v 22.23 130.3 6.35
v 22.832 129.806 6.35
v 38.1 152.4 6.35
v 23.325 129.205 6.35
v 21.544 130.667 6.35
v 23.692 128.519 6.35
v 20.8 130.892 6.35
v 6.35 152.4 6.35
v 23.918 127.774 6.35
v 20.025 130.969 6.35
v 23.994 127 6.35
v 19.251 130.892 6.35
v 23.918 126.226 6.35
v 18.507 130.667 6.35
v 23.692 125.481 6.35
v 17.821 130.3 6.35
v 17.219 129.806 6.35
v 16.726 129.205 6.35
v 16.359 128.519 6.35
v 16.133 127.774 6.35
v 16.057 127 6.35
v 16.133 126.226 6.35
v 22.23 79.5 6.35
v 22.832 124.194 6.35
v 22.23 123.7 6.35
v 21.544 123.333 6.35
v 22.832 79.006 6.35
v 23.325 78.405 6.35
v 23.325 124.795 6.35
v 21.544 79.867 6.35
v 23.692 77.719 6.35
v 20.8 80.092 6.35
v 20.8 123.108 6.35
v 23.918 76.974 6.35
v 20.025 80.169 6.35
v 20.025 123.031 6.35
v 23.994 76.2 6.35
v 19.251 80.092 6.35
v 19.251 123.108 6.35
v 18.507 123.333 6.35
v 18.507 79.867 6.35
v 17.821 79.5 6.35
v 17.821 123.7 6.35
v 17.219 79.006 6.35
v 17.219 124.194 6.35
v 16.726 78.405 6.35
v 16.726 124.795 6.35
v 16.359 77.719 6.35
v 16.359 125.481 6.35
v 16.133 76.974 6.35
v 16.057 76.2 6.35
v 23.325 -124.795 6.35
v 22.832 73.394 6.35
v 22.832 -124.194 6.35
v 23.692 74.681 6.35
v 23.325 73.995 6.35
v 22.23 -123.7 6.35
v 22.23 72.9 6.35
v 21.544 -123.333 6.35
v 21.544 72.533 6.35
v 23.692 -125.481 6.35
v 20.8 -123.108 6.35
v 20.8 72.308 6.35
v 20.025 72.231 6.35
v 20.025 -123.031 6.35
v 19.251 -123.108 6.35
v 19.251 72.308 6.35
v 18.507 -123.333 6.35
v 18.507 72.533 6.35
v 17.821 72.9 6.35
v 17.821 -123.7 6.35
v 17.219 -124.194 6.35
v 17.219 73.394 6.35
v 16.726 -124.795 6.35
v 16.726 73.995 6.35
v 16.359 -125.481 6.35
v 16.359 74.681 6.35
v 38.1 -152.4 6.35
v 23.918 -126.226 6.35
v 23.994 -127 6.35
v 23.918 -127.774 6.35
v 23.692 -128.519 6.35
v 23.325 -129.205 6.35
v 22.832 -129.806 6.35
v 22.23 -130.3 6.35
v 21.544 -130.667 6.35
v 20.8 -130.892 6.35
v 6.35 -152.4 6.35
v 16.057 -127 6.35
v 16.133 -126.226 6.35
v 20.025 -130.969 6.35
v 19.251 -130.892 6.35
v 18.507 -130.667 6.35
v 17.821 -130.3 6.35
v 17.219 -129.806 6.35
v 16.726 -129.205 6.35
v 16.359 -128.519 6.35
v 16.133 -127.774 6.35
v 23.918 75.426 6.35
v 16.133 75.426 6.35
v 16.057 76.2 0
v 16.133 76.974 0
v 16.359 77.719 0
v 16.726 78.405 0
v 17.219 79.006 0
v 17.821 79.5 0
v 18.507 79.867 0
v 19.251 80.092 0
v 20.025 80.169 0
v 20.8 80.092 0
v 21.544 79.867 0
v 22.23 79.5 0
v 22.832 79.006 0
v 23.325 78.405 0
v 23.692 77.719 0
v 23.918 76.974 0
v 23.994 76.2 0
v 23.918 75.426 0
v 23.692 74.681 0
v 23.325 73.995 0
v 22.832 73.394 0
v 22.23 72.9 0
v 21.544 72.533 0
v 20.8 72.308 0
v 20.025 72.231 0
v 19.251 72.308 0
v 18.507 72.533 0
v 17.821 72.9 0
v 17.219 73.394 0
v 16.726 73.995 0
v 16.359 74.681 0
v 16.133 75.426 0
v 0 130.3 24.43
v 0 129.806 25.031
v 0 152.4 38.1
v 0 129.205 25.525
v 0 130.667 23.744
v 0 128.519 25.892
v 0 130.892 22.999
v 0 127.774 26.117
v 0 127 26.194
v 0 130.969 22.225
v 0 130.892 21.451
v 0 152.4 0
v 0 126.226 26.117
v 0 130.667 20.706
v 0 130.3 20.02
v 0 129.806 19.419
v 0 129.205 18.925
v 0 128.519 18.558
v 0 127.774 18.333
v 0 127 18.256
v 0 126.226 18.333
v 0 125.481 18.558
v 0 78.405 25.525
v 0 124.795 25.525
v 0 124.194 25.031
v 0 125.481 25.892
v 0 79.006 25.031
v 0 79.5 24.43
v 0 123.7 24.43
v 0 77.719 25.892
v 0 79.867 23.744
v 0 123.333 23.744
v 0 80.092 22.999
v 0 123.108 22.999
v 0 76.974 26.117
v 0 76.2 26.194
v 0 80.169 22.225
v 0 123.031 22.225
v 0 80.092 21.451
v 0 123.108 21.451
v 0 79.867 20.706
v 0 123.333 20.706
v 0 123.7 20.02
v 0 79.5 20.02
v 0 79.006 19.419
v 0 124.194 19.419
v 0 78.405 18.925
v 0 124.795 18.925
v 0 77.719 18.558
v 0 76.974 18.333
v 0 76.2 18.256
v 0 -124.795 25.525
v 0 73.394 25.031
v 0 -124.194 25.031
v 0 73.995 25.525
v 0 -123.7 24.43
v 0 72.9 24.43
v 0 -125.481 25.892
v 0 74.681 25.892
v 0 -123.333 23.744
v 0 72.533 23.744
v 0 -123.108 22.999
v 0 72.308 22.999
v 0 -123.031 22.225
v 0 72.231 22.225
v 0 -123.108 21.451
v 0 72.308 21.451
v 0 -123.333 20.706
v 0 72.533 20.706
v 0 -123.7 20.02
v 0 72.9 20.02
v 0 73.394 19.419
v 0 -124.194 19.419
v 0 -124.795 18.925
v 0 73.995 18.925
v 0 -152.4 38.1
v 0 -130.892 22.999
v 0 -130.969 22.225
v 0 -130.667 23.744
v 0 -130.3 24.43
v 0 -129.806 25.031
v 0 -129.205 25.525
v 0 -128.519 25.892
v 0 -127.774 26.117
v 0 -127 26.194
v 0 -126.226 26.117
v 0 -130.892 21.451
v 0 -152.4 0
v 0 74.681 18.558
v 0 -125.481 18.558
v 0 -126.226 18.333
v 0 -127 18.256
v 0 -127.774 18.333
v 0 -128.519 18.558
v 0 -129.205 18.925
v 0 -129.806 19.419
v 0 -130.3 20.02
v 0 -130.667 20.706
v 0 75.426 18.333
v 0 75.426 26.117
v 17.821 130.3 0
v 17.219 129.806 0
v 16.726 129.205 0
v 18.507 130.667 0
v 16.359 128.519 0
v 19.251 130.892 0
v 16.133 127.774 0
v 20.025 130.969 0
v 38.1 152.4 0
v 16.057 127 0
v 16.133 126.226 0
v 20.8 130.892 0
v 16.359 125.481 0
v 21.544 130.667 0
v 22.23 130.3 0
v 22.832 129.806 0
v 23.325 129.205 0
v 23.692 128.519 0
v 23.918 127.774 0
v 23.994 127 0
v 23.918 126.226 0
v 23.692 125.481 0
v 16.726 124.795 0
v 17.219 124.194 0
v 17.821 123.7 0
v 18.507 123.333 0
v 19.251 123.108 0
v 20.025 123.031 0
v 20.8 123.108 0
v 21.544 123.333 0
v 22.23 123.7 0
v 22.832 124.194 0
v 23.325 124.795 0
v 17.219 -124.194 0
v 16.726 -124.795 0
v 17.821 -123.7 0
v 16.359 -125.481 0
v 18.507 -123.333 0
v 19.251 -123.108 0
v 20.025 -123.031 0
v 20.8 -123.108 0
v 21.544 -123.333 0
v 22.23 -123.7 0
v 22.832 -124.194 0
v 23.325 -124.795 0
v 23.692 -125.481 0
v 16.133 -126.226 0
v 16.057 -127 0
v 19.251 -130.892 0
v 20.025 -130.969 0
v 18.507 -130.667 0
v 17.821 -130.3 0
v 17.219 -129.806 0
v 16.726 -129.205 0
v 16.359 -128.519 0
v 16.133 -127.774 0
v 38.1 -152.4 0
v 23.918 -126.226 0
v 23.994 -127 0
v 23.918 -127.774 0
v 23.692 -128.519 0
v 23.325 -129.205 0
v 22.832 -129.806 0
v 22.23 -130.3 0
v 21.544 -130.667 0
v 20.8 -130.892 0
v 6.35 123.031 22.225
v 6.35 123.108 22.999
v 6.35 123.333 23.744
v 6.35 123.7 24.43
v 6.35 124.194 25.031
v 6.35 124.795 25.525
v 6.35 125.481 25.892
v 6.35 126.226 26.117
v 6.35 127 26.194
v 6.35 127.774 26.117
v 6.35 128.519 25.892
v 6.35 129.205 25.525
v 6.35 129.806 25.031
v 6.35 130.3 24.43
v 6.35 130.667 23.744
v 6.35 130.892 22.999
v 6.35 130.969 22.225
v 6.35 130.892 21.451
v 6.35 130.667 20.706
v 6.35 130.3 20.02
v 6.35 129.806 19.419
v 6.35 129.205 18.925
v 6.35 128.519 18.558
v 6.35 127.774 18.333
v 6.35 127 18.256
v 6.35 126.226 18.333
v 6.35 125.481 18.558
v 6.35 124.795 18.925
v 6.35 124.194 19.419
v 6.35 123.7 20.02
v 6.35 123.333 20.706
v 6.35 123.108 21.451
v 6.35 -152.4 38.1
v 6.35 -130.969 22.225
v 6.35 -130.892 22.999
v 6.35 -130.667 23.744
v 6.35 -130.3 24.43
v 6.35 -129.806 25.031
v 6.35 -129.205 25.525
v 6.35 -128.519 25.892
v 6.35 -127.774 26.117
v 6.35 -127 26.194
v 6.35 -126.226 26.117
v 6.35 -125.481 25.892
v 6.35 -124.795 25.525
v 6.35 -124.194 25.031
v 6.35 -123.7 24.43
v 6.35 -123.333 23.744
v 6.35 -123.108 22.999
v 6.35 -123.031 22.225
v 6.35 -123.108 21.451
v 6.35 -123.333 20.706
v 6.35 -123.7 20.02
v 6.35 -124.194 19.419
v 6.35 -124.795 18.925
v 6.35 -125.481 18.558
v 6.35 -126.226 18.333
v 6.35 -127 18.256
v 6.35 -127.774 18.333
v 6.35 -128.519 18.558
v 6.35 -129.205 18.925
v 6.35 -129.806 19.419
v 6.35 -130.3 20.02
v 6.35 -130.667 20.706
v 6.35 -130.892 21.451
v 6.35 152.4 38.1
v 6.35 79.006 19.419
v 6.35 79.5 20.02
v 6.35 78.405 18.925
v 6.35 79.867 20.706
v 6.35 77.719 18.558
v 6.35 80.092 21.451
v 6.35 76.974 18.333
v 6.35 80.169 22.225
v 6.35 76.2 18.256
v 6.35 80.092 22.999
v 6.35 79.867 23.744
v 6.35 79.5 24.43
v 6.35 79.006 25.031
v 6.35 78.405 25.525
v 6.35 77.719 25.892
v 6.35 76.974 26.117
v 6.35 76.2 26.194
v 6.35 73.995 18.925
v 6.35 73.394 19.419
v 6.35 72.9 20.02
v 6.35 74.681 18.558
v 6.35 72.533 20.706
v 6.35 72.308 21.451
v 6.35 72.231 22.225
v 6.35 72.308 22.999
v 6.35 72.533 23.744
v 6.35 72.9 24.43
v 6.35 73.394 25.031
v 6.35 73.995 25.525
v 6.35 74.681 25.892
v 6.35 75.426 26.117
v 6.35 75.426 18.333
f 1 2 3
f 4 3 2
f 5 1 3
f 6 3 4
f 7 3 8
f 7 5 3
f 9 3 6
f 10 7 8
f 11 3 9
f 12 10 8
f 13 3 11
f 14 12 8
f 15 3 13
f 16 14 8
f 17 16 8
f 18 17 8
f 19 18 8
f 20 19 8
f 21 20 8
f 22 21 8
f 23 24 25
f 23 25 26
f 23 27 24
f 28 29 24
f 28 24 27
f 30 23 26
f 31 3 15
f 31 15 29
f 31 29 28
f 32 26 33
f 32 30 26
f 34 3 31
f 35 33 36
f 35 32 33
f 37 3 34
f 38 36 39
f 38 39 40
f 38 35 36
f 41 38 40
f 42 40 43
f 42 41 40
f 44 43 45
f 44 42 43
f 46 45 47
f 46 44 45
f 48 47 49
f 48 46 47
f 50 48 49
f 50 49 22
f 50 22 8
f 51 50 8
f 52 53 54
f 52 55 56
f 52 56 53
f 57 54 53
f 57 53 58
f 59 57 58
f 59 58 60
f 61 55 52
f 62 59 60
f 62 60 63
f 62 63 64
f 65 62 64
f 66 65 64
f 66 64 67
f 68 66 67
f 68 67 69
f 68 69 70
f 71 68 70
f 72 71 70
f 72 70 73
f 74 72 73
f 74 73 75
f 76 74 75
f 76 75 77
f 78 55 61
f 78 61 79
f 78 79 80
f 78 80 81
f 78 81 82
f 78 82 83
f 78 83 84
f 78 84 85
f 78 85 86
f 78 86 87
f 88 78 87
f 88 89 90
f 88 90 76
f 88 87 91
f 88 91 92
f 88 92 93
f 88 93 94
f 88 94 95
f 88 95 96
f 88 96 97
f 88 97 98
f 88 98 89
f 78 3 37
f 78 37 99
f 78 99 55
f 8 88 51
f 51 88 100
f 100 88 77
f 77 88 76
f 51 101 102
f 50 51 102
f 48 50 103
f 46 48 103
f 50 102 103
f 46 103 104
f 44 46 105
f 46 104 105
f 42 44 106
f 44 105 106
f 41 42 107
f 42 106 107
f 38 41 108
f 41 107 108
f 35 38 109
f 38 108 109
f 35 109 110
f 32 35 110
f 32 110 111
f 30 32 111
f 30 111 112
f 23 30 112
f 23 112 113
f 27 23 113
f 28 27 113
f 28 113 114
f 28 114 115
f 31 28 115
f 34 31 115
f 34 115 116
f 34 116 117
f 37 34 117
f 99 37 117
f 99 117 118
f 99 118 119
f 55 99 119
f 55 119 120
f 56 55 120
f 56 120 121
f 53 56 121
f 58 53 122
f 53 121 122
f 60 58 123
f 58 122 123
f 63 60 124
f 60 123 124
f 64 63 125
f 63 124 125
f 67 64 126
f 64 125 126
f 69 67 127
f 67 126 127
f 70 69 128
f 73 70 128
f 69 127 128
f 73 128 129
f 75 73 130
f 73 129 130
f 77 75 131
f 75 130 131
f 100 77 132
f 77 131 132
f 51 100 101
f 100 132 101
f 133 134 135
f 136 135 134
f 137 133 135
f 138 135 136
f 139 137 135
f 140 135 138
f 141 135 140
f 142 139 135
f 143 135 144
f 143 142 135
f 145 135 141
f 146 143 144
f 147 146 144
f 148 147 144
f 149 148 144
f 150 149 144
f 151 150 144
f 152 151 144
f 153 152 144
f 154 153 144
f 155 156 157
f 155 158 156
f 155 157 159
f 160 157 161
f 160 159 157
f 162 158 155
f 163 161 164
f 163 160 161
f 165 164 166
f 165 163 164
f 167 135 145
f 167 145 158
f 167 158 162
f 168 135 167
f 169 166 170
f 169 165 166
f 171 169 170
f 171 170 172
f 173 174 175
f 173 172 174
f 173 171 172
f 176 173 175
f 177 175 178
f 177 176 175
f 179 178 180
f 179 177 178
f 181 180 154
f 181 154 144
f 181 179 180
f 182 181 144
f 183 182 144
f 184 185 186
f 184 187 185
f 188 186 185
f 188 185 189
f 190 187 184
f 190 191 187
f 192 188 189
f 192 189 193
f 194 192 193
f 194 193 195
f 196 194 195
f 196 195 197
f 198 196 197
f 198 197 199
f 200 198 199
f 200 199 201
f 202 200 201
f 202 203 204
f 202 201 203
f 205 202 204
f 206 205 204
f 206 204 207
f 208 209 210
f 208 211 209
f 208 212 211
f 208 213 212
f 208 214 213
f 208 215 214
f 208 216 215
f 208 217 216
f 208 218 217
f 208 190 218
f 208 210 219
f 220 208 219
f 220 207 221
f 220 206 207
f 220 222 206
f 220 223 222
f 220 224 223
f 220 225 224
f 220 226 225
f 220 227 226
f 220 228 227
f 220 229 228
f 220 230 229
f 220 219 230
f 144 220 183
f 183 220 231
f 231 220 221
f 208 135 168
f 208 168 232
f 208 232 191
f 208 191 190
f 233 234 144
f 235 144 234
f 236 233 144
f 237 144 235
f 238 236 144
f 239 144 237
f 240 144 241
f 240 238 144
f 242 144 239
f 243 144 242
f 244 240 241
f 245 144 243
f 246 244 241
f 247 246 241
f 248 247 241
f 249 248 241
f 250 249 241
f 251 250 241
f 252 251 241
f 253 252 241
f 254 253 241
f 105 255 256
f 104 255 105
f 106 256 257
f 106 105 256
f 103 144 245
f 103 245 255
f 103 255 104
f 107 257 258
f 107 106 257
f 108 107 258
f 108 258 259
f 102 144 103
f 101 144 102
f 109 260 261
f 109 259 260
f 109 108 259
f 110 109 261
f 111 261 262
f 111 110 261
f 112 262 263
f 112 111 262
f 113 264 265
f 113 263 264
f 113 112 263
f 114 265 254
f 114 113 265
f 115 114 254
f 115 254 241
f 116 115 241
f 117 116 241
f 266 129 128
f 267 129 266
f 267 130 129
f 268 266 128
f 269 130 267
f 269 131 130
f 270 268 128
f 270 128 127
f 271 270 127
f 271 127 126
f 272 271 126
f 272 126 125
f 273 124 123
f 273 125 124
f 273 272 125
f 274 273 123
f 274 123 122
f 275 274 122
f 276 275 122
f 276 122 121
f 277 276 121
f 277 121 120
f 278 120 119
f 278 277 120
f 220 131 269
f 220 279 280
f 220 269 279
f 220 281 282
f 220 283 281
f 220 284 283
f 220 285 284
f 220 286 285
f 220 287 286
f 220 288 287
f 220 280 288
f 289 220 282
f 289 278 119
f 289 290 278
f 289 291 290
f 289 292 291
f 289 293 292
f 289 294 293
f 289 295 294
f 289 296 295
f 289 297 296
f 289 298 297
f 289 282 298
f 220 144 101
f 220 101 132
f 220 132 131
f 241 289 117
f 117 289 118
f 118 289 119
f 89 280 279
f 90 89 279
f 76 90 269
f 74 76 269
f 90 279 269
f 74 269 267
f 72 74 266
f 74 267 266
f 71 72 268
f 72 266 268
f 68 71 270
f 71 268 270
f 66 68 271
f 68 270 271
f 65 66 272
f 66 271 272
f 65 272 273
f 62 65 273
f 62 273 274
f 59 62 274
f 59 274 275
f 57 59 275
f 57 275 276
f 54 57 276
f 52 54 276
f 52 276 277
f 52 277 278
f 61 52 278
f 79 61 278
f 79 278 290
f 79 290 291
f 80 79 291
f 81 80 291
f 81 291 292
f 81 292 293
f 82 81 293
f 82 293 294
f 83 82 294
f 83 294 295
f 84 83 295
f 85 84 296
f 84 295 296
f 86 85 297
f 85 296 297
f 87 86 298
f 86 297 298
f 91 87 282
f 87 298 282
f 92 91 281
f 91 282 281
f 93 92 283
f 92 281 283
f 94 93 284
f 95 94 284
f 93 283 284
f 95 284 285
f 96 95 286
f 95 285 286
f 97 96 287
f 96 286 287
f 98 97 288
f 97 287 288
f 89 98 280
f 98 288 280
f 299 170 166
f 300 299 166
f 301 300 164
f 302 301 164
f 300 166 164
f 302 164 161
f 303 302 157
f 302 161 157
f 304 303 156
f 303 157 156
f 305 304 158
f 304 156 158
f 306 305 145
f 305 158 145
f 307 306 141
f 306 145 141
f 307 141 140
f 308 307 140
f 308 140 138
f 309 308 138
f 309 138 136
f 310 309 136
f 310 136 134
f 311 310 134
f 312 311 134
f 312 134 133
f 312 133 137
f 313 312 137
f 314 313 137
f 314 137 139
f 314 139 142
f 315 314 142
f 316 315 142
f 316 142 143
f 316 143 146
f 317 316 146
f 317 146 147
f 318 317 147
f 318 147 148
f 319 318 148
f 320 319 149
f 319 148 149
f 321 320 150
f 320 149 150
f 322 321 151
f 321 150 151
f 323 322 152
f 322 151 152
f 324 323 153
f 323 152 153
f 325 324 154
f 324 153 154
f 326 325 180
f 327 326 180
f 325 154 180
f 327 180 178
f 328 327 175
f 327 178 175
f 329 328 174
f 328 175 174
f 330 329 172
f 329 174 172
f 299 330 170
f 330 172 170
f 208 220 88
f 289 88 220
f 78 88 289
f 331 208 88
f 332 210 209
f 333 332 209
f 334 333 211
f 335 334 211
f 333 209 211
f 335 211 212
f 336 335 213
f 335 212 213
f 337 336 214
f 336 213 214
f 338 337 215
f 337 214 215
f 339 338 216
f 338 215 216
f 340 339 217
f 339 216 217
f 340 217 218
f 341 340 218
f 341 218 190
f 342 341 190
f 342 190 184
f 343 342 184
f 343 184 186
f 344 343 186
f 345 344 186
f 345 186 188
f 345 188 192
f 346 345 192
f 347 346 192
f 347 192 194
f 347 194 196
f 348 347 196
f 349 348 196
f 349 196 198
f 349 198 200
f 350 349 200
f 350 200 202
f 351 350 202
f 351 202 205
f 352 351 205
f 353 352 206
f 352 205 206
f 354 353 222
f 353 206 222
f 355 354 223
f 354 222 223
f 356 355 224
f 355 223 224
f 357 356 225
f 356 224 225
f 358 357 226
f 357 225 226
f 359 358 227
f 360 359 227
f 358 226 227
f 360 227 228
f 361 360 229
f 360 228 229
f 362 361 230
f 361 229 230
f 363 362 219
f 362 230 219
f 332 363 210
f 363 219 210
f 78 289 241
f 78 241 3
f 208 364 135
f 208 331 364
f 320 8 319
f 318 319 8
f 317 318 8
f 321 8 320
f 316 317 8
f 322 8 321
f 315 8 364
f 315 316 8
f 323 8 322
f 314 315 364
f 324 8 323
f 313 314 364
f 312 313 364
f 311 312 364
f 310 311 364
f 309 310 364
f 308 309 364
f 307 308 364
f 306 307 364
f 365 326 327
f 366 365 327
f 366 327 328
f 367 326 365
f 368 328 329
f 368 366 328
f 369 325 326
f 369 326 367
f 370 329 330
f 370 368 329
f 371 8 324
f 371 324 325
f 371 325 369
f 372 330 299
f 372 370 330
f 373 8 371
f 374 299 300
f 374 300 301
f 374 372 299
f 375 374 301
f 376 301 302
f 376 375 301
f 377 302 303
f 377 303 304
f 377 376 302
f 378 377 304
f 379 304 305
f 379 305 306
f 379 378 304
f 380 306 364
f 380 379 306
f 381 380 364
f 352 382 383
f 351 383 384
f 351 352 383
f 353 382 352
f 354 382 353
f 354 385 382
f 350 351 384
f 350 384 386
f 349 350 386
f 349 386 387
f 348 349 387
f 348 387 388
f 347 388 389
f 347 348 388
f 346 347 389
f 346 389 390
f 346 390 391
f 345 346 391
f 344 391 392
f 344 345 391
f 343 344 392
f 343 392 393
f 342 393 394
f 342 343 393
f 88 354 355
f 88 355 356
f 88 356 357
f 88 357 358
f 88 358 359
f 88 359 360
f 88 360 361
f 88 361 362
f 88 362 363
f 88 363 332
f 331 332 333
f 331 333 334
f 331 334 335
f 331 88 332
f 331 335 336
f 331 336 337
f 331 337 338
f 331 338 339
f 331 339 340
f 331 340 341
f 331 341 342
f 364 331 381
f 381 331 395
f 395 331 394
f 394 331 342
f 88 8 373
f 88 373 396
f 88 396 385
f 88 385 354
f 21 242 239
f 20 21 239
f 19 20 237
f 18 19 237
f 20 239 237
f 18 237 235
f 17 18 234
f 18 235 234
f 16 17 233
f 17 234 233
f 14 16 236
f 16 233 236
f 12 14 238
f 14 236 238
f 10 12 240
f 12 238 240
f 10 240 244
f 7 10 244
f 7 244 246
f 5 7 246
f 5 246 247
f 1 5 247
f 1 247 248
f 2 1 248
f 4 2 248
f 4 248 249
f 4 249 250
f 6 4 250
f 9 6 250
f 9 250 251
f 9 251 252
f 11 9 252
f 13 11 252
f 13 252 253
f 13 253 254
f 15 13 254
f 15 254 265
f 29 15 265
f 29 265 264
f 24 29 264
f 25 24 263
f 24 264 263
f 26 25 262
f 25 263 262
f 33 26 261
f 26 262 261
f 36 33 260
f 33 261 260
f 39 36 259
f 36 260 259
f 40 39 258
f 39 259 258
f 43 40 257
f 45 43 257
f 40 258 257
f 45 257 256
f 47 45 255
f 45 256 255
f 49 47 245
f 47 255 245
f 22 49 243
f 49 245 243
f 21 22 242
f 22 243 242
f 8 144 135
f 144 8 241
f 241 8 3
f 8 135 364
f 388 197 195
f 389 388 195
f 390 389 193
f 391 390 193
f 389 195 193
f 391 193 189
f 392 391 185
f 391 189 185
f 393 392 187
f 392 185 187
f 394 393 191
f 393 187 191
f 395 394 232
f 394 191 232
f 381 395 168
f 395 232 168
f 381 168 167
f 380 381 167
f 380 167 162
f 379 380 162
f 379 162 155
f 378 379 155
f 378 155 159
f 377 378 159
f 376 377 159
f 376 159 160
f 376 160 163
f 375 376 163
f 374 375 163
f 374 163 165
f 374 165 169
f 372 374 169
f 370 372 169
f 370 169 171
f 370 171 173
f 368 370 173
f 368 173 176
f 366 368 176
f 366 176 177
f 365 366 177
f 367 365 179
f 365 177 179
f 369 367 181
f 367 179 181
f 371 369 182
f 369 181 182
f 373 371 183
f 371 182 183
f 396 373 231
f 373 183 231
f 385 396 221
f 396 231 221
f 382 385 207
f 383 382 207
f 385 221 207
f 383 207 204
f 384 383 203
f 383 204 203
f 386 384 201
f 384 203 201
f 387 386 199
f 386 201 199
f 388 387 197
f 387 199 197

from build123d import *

# Parameters (mm, degrees)
F1_DEPTH = 152.4
F3_D     = 7.9375
F5_D     = 7.9375


with BuildPart() as f1:
    # F0 (on Front) → F1 (new body, symmetric)
    with BuildSketch(Plane.XZ):
        Polygon((0, 38.1), (0, 0), (38.1, 0), (38.1, 6.35), (6.35, 6.35), (6.35, 38.1), align=None)
    extrude(amount=F1_DEPTH, both=True)

    # F3 (through all)
    with Locations(Plane.XY.offset(6.35)):
        with Locations((20.025469, -127), (20.025469, 76.2), (20.025469, 127)):
            Hole(F3_D / 2)

    # F5 (through all)
    with Locations(Plane.YZ.offset(6.35)):
        with Locations((-127, 22.225), (76.2, 22.225), (127, 22.225)):
            Hole(F5_D / 2)


solid = f1.part
